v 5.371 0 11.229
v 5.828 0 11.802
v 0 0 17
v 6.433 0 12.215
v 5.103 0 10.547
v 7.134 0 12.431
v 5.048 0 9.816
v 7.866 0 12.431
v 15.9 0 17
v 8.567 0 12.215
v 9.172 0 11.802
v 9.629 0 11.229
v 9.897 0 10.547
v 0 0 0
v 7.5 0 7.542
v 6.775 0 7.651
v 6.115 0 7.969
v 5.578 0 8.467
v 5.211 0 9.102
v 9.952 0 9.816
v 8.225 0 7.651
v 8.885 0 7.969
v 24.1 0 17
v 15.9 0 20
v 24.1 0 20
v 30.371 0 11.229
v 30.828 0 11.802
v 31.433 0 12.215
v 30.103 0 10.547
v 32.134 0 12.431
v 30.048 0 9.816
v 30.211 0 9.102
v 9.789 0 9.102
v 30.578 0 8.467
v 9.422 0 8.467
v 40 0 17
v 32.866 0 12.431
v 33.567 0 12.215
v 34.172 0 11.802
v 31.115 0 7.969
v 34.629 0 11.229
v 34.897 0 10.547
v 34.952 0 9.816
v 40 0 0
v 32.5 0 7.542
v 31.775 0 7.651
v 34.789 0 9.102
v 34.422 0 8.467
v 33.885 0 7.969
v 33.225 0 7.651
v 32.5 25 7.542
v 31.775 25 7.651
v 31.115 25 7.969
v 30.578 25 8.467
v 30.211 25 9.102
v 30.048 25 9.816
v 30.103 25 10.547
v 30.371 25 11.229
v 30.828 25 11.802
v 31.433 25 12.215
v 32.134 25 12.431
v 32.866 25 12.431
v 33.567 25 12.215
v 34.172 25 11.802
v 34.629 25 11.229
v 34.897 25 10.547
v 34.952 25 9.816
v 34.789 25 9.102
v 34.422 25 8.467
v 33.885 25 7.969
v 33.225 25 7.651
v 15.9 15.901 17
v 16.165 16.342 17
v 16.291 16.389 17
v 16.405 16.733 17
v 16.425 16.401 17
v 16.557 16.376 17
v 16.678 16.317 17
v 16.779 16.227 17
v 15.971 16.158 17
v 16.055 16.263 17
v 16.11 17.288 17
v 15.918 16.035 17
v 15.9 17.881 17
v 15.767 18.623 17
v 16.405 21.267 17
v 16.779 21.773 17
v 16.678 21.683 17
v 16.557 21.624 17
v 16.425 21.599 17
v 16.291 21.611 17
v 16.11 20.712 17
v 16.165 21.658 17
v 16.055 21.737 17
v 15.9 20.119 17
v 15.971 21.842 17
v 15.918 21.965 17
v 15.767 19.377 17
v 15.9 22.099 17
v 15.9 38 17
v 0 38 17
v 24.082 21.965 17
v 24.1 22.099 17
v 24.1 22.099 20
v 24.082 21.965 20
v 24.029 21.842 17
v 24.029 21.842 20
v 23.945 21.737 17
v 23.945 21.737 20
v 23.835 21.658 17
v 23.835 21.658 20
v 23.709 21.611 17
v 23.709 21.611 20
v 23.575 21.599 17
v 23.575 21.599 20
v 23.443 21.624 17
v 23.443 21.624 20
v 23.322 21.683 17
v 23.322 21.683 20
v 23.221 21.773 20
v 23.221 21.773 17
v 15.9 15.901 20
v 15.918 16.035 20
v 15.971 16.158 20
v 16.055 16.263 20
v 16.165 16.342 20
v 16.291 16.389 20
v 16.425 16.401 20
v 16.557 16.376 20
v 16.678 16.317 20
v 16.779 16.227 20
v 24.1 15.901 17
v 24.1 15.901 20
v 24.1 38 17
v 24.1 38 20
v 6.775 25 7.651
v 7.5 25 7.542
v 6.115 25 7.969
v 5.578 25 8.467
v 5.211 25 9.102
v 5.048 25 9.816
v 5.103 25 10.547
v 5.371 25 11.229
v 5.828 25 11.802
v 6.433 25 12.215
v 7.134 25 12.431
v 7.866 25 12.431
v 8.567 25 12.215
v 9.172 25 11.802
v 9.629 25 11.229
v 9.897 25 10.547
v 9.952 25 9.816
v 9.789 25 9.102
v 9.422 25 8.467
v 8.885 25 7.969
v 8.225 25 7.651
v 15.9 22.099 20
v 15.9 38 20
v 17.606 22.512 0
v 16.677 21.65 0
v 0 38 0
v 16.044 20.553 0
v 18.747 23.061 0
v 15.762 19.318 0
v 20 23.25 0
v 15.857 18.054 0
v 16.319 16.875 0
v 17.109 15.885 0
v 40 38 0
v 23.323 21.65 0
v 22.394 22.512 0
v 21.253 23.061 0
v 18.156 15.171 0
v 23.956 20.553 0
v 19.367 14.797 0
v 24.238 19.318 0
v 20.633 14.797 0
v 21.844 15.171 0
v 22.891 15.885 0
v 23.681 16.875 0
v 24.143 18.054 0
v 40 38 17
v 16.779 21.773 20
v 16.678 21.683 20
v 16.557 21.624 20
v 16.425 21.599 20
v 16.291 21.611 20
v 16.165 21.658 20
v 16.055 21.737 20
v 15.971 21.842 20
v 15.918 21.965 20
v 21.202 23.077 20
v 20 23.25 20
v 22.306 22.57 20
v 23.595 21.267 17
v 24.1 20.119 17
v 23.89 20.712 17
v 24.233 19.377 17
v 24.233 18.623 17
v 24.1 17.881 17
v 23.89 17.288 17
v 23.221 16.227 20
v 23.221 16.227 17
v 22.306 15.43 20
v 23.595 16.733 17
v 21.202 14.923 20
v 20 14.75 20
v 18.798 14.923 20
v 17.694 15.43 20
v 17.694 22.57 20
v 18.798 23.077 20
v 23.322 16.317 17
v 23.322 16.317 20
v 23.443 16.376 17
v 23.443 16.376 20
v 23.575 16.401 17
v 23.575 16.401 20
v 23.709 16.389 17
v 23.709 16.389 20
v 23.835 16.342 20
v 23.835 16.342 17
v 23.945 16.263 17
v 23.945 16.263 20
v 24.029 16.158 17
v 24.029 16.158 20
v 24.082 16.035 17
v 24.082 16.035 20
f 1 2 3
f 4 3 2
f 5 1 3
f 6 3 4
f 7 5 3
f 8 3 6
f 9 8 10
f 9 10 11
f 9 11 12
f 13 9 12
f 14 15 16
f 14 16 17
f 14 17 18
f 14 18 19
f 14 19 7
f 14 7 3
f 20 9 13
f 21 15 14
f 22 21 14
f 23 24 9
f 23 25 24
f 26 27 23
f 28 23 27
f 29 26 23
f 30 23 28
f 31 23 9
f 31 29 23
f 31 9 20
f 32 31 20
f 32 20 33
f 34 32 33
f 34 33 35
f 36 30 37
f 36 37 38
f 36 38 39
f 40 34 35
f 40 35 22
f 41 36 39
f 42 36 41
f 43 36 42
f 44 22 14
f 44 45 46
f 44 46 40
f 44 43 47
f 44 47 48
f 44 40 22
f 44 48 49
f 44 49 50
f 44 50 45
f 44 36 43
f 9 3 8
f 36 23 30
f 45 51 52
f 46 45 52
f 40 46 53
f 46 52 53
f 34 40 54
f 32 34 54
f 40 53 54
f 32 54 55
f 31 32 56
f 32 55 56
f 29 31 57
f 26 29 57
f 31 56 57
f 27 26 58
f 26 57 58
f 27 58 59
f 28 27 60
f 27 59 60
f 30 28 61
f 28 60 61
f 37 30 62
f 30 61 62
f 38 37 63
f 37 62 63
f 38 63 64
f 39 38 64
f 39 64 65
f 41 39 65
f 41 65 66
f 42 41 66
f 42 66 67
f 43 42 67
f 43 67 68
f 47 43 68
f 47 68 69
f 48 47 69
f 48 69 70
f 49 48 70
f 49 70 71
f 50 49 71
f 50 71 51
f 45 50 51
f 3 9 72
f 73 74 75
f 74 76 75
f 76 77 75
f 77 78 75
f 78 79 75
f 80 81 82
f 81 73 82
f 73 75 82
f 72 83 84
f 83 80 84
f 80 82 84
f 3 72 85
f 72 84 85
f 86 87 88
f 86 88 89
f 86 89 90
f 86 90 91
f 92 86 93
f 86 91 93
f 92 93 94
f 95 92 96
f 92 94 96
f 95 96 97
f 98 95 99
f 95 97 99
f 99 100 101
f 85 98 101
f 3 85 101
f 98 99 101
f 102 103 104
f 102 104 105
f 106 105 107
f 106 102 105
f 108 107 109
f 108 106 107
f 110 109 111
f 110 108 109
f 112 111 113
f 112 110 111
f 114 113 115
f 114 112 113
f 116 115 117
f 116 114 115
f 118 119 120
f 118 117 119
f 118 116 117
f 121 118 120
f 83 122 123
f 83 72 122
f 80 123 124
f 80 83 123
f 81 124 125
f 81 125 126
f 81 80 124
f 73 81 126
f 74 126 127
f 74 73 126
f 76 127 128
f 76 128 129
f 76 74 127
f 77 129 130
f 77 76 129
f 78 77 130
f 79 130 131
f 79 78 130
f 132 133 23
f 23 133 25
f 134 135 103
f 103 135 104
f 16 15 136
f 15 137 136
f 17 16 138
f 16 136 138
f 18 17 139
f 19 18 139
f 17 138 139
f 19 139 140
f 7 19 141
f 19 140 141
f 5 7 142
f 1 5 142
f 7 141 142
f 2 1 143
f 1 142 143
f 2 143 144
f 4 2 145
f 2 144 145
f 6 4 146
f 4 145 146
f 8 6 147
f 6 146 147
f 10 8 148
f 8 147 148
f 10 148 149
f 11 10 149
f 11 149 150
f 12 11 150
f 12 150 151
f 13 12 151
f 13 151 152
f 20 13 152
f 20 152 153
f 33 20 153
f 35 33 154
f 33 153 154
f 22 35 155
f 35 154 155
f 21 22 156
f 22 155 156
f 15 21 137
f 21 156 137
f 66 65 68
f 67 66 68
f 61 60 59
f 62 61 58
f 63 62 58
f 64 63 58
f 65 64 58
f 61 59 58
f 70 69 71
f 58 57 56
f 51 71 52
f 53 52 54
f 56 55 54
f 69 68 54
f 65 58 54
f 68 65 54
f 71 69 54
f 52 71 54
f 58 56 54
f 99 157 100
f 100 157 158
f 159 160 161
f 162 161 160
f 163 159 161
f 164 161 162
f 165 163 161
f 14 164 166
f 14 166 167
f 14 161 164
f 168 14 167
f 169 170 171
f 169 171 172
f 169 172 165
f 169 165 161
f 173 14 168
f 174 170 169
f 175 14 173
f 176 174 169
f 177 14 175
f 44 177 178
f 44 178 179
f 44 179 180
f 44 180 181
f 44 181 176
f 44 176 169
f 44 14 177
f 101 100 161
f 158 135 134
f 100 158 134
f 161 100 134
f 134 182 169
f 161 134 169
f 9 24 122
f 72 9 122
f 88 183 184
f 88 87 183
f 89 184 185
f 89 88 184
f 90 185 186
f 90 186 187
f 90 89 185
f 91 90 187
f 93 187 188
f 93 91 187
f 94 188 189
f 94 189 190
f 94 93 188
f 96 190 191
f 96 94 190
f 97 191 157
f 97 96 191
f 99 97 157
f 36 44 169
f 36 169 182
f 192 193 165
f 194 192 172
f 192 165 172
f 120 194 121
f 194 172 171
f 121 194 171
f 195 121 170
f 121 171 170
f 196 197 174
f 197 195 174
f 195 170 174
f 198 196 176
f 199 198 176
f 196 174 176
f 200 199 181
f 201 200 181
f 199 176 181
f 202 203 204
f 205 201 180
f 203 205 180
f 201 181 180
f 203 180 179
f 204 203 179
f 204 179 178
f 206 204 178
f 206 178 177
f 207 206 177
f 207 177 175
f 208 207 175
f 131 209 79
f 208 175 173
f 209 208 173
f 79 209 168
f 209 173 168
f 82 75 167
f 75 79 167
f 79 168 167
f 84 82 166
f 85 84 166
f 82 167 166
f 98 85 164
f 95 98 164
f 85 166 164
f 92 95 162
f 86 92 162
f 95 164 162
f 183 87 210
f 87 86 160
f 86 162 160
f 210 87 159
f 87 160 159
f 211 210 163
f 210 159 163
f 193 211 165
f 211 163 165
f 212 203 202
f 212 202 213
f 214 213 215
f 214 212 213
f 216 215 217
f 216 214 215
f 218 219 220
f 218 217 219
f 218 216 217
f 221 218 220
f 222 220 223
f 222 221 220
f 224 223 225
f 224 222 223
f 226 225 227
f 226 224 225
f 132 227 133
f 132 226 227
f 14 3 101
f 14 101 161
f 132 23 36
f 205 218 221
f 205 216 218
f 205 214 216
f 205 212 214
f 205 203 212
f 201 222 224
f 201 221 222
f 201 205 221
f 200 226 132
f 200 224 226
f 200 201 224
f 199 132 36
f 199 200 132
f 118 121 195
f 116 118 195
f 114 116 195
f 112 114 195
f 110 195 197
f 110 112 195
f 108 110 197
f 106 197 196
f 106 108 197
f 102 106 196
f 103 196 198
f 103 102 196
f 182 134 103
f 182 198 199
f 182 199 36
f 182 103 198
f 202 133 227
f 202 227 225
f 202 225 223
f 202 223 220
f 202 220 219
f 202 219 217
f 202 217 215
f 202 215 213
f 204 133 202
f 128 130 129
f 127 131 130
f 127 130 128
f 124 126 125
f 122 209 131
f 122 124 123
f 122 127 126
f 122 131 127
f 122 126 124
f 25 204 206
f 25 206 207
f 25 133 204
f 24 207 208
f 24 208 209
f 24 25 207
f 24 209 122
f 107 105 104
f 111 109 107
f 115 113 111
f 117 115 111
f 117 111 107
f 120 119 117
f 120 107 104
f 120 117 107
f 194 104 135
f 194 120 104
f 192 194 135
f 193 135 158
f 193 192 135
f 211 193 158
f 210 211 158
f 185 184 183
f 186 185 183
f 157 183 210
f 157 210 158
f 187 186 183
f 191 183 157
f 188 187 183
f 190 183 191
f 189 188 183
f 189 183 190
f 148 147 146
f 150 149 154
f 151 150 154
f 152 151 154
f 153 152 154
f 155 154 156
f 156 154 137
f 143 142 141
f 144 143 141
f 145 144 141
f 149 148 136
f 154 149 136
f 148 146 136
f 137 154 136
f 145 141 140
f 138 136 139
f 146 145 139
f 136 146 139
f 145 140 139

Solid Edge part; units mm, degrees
sketch "Sketch1" plane through (0, 0, 0) normal (0, -1, 0) x (1, 0, 0)
  line L0 (40, 0) -> (40, 20)
  line L1 (40, 20) -> (0, 20)
  line L2 (0, 20) -> (0, 0)
  line L3 (0, 0) -> (40, 0)
extrude "Protrusion1" add sketch "Sketch1" against normal blind 38
hole "Bohrung_1" at (7.5, 0, 10) direction (0, 1, 0) diameter 4.917 depth 25 thread major 6 thread length 20
hole "Hole1" at (32.5, 0, 10) direction (0, 1, 0) diameter 4.917 depth 25 thread major 6 thread length 20
sketch "Sketch2" plane through (20, 19, 20) normal (0, 0, 1) x (0, 1, 0)
  line L0 (-19, 4.1) -> (-19, 20)
  line L1 (19, 20) -> (-19, 20)
  line L2 (19, 4.1) -> (19, 20)
  line L3 (-19, 4.1) -> (19, 4.1)
  line L4 (19, -20) -> (19, -4.1)
  line L5 (19, -4.1) -> (-19, -4.1)
  line L6 (-19, -20) -> (-19, -4.1)
  line L7 (19, -20) -> (-19, -20)
extrude "Extrusionsausschnitt_1" cut sketch "Sketch2" against normal blind 3
hole "Bohrung_4" at (20, 19, 0) direction (0, 0, 1) diameter 8.5 end through all
fillet "Verrundung_2" radius 0.5 4 edges at (24.1, 17.8808, 18.5) (15.9, 17.8808, 18.5) (15.9, 20.1192, 18.5) (24.1, 20.1192, 18.5)
